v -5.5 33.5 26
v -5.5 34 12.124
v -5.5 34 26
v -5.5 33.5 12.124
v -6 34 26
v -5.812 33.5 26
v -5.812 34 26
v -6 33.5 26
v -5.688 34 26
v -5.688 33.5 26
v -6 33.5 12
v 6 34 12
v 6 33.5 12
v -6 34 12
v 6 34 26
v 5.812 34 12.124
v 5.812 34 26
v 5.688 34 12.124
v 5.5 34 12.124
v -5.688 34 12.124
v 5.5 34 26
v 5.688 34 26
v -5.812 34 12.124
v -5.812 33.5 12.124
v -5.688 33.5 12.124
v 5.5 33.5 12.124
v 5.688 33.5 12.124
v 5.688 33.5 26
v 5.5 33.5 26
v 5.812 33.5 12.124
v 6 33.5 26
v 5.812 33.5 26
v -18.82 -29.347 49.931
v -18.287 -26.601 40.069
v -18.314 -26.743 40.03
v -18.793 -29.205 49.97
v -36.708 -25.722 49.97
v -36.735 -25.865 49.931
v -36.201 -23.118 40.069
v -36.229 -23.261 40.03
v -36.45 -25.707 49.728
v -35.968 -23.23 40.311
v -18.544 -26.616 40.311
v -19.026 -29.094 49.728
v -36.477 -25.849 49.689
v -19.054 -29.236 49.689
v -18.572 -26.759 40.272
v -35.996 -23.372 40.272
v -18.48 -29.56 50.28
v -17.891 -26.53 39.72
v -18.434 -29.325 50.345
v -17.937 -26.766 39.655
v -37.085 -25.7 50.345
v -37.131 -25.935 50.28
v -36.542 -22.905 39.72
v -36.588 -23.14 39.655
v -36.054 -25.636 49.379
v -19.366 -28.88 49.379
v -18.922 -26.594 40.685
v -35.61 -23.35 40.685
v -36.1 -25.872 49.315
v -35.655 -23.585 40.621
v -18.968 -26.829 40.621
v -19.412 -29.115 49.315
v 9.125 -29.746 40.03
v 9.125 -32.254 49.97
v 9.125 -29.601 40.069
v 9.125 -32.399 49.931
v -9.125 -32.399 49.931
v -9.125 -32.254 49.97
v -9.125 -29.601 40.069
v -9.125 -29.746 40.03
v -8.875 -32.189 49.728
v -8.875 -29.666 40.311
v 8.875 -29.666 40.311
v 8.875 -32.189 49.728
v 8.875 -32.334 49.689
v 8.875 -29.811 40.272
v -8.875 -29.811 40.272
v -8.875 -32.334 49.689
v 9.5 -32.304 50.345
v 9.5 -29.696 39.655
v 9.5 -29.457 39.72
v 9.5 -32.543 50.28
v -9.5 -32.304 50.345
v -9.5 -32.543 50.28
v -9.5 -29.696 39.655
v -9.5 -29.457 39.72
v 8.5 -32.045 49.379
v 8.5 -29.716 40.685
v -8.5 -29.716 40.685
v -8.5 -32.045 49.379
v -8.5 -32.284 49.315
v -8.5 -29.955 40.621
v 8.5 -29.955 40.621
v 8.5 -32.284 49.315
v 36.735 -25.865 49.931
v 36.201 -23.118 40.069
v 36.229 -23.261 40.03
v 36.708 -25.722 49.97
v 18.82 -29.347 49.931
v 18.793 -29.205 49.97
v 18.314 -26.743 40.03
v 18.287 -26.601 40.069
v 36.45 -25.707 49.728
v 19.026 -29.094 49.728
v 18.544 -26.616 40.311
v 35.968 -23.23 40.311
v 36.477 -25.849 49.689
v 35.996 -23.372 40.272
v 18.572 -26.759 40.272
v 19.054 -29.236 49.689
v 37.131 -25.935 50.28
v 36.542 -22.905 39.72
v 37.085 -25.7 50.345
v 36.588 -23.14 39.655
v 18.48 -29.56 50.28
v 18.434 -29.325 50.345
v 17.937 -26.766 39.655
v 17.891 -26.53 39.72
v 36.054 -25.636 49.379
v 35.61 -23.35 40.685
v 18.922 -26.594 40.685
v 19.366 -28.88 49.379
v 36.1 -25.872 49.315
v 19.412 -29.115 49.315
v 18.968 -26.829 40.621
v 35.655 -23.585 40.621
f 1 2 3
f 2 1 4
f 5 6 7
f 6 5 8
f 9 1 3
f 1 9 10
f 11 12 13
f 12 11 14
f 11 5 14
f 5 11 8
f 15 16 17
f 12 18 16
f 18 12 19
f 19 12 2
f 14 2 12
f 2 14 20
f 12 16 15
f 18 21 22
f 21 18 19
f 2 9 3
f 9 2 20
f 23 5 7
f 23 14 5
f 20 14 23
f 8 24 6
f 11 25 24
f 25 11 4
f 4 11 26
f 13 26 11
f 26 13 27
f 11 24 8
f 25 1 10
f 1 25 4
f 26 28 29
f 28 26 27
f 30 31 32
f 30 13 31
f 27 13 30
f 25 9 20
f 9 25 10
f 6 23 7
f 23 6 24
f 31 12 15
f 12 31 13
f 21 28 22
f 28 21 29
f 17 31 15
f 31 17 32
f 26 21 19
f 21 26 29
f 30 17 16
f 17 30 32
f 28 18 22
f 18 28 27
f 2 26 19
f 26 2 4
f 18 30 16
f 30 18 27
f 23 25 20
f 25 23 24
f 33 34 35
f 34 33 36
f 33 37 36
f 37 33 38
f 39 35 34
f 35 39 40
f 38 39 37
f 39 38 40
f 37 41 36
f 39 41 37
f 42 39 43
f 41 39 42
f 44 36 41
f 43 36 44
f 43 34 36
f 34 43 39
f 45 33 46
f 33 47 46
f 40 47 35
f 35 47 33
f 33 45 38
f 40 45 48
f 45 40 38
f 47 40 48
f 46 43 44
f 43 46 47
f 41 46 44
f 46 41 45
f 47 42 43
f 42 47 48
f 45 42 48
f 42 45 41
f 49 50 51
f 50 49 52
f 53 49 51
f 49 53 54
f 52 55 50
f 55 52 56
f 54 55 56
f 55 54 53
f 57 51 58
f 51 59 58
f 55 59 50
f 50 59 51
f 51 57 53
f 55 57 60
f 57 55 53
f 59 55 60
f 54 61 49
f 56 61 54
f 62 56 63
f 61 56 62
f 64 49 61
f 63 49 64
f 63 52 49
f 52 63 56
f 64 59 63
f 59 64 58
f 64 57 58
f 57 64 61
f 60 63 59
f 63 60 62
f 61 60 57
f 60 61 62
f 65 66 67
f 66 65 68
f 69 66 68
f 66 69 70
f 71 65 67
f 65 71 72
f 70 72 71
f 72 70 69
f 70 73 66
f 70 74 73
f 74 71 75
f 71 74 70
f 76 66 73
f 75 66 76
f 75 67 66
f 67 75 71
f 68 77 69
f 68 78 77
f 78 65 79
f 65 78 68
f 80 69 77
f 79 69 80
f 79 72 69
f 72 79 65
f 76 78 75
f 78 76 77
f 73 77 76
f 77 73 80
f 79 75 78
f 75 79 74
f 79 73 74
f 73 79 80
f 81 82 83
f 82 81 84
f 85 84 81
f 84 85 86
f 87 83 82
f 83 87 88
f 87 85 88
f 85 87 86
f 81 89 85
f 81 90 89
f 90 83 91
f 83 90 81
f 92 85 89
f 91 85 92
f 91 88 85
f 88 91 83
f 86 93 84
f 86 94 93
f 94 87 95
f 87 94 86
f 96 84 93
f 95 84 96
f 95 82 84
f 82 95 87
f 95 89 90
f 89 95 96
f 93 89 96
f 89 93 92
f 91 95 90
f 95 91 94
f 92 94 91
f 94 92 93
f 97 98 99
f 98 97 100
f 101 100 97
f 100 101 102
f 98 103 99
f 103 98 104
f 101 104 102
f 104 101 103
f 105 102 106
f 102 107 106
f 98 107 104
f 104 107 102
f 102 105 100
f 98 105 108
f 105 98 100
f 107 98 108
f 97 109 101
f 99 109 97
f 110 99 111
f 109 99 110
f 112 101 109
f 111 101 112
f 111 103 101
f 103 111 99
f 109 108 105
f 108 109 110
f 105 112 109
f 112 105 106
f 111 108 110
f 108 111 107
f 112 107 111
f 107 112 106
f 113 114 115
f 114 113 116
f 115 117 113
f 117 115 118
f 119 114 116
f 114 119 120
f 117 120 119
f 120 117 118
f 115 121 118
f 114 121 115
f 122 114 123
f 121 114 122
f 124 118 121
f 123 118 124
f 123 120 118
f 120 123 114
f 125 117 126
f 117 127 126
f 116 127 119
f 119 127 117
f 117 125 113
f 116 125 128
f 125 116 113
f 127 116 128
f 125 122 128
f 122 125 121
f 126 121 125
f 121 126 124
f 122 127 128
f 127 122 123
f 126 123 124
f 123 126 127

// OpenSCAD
// ============================================================================
// MODULE: CNC INTEGRATED ATX MAINBOARD HOUSING & FLAT PANEL DISPLAY MOUNTS
// CONFIGURATION: FRAME-INTEGRATED SLIDE CHANNELS (ZERO-BOLT FASTENER METHOD)
// COMPLIANCE: 0.062" SKELETON WALL THICKNESS RATIO CEILING (DOC ENFORCED)
// ============================================================================

$fn = 120; // Maintain crisp edge radii for precise snap-fit interface slots

// --- AVIONICS DIMENSIONS CONSTANTS (INCHES) ---
SKELETON_WALL = 0.062;       // Maximum allowed thickness for internal framing ribs
ATX_BOARD_W = 12.0;          // Width clearance for standard computer layout block
ATX_TRACK_SLOT = 0.125;      // Width of the sliding alignment groove
SCREEN_MOUNT_W = 18.0;       // Wide-format flat panel display dimension
SCREEN_MOUNT_H = 10.0;       // Display panel vertical profile scale

module IntegratedATXChassisCradle() {
    // Carves parallel vertical tracks straight out of the internal 0.062" hat-stringers
    echo("CNC Track: Milling Zero-Bolt Vertical ATX Computer Rail Housings");
    color("DarkSlateGray")
    union() {
        // Left Rails Track Guide
        translate([-ATX_BOARD_W / 2, 0, 0])
        difference() {
            cube([0.5, 0.5, 14.0]); // Vertical mounting rail extension
            // Internal sliding track cut
            translate([0.25 - (ATX_TRACK_SLOT / 2), -0.1, -0.1])
            cube([ATX_TRACK_SLOT, 0.7, 14.2]);
        }
        
        // Right Rails Track Guide
        translate([ATX_BOARD_W / 2 - 0.5, 0, 0])
        difference() {
            cube([0.5, 0.5, 14.0]);
            translate([0.25 - (ATX_TRACK_SLOT / 2), -0.1, -0.1])
            cube([ATX_TRACK_SLOT, 0.7, 14.2]);
        }
        
        // Bottom stop safety shelf to rest the computer core weight
        translate([-ATX_BOARD_W / 2, 0, 0])
        cube([ATX_BOARD_W, 0.5, SKELETON_WALL * 2]);
    }
}

module PanoramicFlatScreenDashMount() {
    // Generates a wide-profile bezel seat directly on the horizontal Z-frame cross loops
    echo("CNC Track: Patterning 18-Inch Flat Screen Dashboard Frame Mounts");
    color("Silver")
    difference() {
        // Main flat display mounting plate blank face
        cube([SCREEN_MOUNT_W + 1.0, SKELETON_WALL * 4, SCREEN_MOUNT_H + 1.0], center = true);
        
        // Center viewing pass-through window box for screen heat-sync venting
        cube([SCREEN_MOUNT_W - 1.0, 1.0, SCREEN_MOUNT_H - 1.0], center = true);
        
        // Perimeter Bevel Groove: Enables the display panel to slide down and snap-lock flush
        difference() {
            cube([SCREEN_MOUNT_W + 0.25, 0.15, SCREEN_MOUNT_H + 0.25], center = true);
            cube([SCREEN_MOUNT_W - 0.25, 0.20, SCREEN_MOUNT_H - 0.25], center = true);
        }
    }
}

module PopulateAvionicsBay(capsule_interior_radius) {
    // Arrays the finished components accurately against the cockpit structural nodes
    union() {
        // Position the ATX computer mainframes low on the aft compartment wall
        translate([0, capsule_interior_radius - 1.5, 12.0])
        IntegratedATXChassisCradle();
        
        // Array three panoramic main pilot displays directly in front of the crew axis
        for (dash_offset = [-22, 0, 22]) {
            rotate([0, 0, dash_offset / 2])
            translate([dash_offset, -capsule_interior_radius + 4.0, 45.0]) // Dashboard vision height
            rotate([15, 0, 0]) // Tilted 15 degrees for ergonomics and visibility
            PanoramicFlatScreenDashMount();
        }
    }
}

// ============================================================================
// CNC FACTORY WORKSPACE COMPLIANCE RUN STAGE
// ============================================================================
// Simulates the internal cockpit hardware layout verification
PopulateAvionicsBay(capsule_interior_radius = 35.0);
